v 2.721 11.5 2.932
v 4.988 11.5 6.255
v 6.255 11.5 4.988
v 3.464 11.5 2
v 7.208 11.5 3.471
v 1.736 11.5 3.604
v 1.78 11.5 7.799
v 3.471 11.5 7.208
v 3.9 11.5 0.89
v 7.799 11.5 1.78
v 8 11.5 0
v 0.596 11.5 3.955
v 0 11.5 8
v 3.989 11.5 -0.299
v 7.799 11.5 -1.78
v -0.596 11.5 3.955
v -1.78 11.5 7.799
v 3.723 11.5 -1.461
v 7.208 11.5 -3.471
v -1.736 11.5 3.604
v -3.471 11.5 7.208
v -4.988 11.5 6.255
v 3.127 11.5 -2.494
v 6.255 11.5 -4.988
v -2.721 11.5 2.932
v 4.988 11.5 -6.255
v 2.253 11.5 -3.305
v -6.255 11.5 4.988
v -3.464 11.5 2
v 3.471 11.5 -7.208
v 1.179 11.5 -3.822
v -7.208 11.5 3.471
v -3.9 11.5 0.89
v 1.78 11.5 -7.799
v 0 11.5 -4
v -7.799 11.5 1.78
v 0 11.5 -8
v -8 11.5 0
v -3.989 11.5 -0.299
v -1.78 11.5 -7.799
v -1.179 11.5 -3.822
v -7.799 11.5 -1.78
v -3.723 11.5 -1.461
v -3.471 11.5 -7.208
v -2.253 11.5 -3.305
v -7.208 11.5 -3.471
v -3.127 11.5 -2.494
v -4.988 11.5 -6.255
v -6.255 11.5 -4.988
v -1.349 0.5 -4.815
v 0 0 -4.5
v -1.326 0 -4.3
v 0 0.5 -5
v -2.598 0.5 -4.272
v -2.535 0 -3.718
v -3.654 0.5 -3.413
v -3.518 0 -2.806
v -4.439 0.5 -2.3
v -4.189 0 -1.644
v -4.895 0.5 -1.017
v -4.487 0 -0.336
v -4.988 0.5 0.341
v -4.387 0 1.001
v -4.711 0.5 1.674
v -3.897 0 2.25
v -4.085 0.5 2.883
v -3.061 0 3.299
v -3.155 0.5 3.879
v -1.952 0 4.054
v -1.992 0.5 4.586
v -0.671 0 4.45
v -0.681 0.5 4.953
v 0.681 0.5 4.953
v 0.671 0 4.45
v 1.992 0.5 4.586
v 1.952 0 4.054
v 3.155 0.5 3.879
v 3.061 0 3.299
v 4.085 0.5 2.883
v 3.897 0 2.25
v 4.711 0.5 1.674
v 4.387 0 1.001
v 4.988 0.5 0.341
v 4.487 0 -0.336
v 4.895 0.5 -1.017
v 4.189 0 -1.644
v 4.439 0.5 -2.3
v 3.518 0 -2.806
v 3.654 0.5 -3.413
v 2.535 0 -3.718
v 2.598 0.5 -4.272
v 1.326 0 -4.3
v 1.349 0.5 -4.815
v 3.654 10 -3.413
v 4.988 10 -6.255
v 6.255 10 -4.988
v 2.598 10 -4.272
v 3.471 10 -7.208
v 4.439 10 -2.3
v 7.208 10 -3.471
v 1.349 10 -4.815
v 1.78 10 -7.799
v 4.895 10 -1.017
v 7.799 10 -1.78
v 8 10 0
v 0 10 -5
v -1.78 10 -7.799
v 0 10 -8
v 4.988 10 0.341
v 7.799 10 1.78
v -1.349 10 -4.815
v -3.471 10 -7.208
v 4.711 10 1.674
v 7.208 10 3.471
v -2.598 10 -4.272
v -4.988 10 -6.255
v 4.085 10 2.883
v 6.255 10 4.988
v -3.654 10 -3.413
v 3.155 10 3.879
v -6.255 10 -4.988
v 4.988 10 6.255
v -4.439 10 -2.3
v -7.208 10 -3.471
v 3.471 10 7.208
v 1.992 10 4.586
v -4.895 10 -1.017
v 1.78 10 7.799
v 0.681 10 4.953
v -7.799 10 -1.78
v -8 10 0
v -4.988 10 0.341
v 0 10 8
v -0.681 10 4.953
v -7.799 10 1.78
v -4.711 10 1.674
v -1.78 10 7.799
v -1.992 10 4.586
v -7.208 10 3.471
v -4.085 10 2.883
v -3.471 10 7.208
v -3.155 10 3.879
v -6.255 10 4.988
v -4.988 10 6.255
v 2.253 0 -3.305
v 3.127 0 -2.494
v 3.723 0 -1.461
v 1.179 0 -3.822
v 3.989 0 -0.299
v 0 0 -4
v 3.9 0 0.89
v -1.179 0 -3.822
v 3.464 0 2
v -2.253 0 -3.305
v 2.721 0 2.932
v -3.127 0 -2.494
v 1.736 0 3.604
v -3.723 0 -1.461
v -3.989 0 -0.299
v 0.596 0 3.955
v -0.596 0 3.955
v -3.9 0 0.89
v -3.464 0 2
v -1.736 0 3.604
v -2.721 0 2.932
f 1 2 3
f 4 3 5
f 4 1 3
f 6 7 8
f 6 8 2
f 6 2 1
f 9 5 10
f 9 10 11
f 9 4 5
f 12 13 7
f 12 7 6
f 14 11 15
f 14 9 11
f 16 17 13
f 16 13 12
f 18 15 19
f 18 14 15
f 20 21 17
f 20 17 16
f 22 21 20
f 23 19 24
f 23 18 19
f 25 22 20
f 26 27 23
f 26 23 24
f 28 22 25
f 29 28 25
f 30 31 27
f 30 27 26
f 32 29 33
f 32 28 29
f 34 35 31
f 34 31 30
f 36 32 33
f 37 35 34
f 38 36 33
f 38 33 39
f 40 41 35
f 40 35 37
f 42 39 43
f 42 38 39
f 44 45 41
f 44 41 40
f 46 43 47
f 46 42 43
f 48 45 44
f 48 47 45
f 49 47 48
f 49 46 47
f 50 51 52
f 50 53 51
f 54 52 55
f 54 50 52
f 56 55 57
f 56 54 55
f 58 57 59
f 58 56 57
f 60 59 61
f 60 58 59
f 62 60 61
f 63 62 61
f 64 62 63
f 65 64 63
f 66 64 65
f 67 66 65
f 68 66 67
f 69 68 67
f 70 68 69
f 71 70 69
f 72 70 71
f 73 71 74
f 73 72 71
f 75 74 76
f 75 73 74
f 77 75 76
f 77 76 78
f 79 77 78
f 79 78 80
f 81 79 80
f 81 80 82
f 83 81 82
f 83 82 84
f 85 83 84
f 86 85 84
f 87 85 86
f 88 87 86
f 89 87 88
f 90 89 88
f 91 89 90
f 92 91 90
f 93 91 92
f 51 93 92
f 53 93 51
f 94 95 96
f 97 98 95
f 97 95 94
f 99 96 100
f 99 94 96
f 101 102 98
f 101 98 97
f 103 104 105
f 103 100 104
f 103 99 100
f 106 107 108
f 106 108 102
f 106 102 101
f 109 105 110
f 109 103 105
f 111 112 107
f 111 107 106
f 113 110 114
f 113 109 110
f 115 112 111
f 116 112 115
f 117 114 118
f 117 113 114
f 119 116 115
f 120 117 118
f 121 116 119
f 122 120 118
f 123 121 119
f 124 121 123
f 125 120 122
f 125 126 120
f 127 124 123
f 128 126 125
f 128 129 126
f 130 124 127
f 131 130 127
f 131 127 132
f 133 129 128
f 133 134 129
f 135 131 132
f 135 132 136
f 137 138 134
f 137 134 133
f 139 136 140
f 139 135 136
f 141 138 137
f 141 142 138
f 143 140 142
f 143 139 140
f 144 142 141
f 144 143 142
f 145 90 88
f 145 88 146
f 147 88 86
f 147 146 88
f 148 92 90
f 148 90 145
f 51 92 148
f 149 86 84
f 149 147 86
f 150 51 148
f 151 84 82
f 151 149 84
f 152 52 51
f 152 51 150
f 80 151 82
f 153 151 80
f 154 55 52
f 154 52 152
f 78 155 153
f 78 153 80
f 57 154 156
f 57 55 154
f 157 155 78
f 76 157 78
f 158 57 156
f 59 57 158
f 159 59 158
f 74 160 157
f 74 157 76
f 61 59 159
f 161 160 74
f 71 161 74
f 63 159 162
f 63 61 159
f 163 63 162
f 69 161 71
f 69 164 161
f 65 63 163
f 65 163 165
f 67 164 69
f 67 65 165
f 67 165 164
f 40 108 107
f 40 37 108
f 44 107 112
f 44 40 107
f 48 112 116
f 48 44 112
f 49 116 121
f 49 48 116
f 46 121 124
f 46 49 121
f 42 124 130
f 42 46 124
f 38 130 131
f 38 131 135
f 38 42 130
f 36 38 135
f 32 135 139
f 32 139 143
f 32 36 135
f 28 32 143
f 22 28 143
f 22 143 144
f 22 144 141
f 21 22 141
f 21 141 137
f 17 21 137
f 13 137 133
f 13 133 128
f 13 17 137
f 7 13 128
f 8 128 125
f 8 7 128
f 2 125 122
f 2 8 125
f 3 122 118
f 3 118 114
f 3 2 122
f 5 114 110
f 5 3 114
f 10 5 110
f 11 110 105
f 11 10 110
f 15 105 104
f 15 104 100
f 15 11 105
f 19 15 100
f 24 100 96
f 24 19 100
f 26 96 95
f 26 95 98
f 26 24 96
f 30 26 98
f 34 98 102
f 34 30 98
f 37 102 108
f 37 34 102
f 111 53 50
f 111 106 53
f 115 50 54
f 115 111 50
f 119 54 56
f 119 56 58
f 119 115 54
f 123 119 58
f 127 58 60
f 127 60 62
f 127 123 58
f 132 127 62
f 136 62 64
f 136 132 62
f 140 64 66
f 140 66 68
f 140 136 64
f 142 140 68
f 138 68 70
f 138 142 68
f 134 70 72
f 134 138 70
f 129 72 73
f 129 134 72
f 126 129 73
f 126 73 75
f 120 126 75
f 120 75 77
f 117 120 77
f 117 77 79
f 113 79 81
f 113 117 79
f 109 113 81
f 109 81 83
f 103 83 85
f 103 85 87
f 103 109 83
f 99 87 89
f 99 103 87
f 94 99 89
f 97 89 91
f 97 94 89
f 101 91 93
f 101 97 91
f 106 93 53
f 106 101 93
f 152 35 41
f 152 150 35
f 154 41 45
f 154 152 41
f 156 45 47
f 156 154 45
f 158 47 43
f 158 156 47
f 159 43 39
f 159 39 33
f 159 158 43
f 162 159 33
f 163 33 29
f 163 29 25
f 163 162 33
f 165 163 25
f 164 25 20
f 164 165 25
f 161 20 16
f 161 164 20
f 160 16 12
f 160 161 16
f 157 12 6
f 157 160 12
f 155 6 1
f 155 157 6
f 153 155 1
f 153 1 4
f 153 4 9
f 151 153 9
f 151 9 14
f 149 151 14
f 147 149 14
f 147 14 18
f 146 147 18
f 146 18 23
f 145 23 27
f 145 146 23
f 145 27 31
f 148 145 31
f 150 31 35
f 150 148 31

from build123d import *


with BuildPart() as part:
    # Esquisse1 → Base-Révolution (revolve)
    with BuildSketch(Plane.XY, mode=Mode.PRIVATE) as base_r_volution_sk:
        Polygon((4, 0), (4.5, 0), (5, 0.5), (5, 10), (8, 10), (8, 11.5), (4, 11.5), align=None)
    revolve(base_r_volution_sk.sketch.rotate(Axis((0, 0, 0), (0, 1, 0)), 90), axis=Axis((0, 0, 0), (0, 1, 0)))


solid = part.part
